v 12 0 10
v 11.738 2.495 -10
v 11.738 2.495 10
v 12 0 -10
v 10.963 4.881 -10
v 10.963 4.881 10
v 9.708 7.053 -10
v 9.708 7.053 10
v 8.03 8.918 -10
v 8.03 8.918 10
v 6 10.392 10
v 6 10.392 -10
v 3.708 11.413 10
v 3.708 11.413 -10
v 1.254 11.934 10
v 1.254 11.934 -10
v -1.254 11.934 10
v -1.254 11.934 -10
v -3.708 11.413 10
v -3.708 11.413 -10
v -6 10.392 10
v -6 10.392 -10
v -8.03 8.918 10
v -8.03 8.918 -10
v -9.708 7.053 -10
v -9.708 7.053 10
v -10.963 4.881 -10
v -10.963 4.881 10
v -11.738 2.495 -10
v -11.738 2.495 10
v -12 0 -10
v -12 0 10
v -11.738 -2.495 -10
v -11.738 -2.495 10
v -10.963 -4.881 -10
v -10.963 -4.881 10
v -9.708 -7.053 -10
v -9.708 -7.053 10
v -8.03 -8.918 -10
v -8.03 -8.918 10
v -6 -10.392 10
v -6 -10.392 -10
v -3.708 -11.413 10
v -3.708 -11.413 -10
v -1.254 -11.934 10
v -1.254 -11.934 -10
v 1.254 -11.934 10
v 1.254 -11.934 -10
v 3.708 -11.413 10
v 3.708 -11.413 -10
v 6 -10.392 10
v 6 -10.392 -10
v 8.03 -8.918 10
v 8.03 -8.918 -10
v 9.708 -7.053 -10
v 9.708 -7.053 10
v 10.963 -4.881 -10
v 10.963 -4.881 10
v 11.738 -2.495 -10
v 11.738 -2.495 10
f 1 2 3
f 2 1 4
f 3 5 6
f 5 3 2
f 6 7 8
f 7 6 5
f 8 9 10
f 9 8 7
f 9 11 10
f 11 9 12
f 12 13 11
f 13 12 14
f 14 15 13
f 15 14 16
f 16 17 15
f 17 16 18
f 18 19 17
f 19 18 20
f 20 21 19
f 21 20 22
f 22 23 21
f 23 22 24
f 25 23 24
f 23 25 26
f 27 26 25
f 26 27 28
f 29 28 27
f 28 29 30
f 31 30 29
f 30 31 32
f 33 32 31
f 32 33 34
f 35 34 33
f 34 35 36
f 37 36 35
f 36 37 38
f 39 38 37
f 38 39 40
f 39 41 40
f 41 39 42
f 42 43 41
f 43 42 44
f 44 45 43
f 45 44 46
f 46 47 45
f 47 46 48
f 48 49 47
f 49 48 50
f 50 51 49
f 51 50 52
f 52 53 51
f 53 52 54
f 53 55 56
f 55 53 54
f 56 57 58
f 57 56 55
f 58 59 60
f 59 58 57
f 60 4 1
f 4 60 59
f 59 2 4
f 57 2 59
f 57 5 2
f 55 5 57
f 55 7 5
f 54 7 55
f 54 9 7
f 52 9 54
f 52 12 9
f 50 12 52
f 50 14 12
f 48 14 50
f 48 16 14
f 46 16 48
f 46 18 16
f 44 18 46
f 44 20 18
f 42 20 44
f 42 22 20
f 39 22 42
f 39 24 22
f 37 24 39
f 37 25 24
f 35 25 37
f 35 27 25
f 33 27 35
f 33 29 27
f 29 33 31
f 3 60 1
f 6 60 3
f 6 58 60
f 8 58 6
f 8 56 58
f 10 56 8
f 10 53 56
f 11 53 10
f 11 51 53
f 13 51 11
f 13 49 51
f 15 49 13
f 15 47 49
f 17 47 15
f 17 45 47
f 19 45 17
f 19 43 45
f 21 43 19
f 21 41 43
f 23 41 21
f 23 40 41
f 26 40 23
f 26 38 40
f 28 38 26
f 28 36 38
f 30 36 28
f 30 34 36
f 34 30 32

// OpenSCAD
// Generated by generate_scads.py
cylinder(h=20, r=12, center=true);
